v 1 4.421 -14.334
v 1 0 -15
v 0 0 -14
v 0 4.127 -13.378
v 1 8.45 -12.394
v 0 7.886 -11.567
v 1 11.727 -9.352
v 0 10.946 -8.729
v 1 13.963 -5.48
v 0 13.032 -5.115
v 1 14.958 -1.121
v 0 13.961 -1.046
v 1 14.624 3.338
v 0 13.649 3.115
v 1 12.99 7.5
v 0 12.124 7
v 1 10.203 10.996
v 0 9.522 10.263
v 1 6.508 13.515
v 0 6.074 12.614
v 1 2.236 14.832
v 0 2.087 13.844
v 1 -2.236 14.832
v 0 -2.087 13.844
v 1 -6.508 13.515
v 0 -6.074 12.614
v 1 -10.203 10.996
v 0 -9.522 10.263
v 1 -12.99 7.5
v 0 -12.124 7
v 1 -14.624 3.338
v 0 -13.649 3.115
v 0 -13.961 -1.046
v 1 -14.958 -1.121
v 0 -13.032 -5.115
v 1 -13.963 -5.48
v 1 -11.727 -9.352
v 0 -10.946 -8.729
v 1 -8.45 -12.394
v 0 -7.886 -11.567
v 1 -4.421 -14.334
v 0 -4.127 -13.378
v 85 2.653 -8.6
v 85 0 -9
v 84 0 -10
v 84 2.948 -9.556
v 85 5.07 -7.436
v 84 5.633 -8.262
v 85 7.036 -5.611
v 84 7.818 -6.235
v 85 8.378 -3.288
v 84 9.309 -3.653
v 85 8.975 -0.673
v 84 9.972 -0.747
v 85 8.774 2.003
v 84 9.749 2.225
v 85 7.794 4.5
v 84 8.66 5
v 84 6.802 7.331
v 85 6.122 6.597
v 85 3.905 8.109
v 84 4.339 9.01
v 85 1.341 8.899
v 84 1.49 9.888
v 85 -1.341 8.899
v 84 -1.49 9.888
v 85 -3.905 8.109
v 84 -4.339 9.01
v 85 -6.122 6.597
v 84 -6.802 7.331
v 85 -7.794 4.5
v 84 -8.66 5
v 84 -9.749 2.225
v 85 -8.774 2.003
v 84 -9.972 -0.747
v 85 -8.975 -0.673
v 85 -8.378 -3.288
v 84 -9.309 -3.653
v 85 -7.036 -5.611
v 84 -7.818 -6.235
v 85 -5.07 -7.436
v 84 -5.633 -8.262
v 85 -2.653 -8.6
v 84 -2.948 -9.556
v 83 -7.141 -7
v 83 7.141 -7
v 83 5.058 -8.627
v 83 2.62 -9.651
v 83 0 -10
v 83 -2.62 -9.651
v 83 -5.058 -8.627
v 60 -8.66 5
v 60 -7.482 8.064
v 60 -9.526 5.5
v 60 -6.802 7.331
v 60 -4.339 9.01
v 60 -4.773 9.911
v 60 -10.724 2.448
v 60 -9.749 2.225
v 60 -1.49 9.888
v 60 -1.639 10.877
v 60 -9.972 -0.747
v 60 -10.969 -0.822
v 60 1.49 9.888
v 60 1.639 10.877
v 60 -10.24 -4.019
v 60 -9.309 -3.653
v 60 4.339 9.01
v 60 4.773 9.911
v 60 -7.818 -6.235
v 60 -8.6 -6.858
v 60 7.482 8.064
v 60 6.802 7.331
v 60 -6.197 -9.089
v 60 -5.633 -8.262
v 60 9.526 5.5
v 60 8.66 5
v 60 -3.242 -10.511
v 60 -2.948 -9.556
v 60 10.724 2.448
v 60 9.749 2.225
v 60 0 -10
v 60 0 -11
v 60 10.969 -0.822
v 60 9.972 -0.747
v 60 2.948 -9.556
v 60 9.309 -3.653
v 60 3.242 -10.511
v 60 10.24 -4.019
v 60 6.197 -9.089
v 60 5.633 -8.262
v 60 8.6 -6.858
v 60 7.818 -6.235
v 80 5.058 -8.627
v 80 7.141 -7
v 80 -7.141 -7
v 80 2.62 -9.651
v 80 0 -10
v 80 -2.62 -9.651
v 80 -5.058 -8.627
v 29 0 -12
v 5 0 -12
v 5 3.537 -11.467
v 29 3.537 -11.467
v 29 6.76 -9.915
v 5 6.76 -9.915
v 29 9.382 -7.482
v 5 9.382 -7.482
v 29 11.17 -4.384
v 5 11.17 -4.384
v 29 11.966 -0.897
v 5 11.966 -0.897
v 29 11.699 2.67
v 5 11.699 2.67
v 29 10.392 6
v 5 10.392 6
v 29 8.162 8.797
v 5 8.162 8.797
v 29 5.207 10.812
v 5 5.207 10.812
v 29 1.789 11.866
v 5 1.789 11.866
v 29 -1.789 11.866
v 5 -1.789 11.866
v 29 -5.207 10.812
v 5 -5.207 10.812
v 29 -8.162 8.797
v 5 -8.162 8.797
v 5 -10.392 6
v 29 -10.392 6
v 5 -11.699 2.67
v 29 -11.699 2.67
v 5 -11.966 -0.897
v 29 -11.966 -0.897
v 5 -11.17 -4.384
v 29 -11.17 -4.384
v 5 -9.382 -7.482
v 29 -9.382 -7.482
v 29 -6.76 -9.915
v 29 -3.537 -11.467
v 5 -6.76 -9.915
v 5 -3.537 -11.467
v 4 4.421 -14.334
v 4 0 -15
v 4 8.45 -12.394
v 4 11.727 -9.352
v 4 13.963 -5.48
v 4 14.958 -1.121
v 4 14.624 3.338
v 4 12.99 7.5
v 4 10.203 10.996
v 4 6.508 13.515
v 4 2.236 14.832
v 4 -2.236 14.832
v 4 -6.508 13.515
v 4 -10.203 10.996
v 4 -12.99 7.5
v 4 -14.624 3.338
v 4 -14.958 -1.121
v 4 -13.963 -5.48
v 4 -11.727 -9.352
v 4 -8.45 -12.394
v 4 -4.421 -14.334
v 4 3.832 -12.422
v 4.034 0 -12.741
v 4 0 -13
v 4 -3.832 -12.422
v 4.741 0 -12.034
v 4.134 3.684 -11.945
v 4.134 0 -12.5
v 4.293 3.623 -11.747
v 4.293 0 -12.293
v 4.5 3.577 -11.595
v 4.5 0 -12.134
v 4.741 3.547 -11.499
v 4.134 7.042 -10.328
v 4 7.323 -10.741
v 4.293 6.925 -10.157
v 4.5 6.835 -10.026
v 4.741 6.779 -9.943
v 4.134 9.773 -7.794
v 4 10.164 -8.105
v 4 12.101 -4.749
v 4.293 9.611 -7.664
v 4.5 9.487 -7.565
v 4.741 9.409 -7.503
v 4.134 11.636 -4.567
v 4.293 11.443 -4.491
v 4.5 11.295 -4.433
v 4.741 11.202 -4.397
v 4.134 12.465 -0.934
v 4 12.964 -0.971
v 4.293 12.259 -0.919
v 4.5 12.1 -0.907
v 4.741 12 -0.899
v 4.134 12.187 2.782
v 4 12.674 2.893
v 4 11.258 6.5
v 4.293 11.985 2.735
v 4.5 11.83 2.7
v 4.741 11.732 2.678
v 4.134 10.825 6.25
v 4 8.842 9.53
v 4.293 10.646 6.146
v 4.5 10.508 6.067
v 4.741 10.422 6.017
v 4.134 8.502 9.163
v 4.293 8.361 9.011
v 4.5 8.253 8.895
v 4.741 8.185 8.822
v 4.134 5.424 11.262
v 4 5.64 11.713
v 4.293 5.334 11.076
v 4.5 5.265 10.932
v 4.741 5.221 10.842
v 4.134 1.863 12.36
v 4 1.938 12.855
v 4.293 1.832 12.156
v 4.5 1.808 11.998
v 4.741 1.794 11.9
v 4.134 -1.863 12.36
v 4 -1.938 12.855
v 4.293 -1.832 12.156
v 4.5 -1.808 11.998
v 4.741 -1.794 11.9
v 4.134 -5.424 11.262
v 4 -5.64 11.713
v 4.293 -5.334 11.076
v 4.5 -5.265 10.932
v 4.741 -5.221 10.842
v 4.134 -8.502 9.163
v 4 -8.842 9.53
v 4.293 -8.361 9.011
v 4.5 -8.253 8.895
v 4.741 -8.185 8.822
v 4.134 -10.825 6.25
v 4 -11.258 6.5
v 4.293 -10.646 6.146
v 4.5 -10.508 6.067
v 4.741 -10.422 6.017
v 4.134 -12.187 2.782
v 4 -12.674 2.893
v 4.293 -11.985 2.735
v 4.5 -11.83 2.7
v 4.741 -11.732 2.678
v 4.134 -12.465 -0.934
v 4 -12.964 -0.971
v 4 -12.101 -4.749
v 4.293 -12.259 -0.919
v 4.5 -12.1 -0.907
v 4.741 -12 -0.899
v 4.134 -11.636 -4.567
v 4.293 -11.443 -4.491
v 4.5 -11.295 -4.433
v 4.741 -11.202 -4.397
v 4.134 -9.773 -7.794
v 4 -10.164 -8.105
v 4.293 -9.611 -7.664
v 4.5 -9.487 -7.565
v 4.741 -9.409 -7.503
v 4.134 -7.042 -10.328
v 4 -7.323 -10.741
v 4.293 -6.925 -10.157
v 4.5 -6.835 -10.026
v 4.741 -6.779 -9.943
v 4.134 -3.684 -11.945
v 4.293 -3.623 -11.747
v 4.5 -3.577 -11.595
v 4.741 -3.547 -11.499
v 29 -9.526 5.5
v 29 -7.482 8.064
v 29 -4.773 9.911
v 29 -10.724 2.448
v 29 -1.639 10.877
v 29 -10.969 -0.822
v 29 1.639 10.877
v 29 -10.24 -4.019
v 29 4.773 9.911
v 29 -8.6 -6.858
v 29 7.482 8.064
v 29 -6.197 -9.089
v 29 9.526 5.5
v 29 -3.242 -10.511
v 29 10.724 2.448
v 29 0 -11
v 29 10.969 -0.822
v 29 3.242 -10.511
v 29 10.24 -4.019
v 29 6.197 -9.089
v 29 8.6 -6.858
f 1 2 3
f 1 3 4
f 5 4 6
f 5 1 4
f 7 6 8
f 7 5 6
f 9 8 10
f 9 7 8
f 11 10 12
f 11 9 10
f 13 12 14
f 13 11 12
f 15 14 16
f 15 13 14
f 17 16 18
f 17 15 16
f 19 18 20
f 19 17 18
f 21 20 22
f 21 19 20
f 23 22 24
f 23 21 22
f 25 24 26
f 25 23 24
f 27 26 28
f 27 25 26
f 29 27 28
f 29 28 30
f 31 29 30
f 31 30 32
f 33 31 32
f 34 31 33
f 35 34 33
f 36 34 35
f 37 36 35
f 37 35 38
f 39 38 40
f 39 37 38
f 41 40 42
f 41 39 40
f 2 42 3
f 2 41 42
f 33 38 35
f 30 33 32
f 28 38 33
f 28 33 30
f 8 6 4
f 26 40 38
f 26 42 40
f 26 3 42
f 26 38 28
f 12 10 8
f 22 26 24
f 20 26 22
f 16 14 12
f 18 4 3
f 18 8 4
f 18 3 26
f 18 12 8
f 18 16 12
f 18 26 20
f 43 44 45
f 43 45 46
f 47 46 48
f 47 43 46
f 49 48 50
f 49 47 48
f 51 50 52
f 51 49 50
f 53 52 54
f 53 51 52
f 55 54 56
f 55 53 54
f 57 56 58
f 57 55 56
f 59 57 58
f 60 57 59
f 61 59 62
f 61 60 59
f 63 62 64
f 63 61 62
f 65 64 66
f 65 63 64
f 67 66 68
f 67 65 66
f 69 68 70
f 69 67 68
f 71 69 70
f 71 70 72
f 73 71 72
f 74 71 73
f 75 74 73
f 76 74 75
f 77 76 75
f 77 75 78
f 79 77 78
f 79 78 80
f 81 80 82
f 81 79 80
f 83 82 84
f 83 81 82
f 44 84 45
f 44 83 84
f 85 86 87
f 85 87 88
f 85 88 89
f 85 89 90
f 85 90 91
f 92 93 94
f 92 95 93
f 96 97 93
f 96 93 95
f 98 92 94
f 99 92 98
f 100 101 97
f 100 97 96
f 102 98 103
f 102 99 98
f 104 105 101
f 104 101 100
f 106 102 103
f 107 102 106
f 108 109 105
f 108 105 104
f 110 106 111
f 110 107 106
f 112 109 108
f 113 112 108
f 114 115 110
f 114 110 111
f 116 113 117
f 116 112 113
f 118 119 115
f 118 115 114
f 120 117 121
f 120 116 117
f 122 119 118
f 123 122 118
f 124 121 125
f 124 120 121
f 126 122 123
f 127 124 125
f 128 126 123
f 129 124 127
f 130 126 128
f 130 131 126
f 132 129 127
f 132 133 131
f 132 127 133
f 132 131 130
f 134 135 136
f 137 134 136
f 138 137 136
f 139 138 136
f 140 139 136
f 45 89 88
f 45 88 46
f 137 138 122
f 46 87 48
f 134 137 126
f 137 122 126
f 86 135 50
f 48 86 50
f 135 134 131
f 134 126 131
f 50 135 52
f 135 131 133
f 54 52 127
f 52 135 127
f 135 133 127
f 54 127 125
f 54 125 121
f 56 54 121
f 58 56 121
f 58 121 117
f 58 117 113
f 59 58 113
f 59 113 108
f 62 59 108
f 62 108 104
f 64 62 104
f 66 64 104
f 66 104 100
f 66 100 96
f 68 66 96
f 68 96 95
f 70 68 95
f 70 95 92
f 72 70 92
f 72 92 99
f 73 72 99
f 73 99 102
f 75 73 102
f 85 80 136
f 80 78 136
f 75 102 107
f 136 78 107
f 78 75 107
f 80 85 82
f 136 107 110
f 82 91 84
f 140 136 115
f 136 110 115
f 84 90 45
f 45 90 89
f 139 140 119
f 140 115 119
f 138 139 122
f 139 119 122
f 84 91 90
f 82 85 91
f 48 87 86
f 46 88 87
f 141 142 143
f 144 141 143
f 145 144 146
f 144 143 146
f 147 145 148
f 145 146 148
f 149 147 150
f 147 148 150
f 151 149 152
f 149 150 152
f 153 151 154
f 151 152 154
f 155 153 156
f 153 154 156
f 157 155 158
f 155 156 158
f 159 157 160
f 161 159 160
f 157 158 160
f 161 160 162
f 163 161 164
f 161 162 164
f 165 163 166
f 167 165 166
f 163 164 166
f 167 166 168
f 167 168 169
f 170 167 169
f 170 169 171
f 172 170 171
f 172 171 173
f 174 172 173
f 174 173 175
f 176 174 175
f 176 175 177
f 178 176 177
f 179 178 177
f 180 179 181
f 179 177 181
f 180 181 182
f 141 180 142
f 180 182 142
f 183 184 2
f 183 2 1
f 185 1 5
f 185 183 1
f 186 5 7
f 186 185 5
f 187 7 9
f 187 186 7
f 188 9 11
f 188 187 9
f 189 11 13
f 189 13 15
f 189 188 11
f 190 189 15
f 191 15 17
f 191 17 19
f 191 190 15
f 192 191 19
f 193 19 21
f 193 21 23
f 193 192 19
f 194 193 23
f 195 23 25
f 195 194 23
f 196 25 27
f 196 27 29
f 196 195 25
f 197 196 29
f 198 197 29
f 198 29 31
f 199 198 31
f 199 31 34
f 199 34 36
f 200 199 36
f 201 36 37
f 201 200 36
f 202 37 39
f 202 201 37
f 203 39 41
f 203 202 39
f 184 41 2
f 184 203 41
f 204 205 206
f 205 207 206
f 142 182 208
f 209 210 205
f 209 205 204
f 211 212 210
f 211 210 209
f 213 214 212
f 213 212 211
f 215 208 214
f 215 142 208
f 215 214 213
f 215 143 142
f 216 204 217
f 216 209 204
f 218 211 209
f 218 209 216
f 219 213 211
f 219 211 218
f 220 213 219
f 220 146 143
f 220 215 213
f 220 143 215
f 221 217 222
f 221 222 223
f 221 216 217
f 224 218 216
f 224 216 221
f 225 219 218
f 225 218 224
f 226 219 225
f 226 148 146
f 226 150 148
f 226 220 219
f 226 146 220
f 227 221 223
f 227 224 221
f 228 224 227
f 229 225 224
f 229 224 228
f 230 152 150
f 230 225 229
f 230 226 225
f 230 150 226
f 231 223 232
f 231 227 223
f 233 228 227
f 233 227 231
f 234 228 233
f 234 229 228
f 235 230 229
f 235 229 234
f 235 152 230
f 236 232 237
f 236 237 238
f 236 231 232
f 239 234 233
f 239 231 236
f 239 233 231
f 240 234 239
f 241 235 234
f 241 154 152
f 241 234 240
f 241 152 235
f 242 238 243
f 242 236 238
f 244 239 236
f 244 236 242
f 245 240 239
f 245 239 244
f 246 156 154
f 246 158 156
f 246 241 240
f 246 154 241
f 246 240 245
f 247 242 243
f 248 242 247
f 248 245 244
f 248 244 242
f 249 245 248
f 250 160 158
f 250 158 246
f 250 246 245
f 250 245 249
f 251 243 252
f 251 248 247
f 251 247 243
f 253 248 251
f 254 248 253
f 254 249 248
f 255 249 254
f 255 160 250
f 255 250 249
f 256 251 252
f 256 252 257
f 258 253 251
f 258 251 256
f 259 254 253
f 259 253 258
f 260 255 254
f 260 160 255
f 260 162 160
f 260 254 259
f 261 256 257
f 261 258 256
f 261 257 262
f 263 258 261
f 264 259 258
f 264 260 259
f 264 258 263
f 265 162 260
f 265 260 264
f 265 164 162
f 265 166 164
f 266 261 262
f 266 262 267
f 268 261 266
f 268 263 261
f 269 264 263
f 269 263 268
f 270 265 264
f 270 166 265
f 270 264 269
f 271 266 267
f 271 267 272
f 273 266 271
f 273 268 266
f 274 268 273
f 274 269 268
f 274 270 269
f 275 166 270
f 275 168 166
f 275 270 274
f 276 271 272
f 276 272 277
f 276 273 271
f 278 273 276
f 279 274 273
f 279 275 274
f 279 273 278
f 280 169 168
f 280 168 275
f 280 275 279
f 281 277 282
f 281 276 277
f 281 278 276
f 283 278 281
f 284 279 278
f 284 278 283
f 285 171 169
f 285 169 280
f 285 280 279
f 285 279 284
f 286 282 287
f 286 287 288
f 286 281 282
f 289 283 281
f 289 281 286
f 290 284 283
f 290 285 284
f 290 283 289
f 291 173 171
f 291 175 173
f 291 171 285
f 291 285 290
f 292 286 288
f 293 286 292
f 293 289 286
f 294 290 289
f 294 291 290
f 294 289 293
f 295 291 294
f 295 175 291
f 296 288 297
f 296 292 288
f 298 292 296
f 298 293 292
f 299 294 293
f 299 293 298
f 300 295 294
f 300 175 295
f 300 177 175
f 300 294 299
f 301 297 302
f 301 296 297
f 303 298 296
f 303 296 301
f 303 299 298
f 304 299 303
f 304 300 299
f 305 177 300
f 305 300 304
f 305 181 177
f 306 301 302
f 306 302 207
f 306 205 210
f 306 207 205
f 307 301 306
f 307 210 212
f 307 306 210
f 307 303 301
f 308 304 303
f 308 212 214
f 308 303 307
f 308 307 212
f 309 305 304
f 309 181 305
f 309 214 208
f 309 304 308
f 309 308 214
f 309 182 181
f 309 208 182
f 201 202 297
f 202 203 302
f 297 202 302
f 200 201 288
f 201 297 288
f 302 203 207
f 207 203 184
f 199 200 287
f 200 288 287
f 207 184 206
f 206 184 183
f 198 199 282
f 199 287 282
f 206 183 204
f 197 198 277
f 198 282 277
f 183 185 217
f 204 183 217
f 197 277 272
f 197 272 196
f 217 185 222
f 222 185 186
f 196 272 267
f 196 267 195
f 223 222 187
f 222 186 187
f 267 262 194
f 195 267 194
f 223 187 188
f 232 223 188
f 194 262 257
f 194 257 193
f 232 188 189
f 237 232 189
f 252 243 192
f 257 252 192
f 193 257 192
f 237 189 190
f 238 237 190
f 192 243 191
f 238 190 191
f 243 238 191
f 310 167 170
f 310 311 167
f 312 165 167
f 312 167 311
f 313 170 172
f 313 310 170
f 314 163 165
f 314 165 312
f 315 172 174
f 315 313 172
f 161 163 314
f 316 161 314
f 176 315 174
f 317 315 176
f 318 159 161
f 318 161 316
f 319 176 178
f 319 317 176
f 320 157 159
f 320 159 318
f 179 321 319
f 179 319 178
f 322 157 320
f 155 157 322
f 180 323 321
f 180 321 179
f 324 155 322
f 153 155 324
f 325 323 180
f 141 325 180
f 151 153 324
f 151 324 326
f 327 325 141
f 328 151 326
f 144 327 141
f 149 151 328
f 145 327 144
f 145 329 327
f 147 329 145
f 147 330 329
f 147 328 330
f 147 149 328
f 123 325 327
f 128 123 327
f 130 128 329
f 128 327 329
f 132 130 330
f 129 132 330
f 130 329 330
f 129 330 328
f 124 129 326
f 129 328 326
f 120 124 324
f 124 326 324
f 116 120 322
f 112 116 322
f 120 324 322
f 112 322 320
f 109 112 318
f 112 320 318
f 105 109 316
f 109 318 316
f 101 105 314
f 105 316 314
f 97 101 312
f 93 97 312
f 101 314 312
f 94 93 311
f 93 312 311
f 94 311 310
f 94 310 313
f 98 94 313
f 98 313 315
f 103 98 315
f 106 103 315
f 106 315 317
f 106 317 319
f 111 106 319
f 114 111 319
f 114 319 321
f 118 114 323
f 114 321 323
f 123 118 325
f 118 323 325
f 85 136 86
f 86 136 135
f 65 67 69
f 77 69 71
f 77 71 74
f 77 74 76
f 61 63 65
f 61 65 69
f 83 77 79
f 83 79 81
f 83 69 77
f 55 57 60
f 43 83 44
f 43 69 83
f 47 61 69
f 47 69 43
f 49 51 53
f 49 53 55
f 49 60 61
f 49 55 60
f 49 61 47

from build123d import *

# Parameters (mm, degrees)
SKETCH_1_W          = 4
SKETCH_1_H          = 15
SKETCH_2_R          = 12
EXTRUDE_1_DEPTH     = 25
SKETCH_3_R          = 11
EXTRUDE_2_DEPTH     = 31
SKETCH_4_R          = 10
EXTRUDE_3_DEPTH     = 25
CUT_EXTRUDE_1_DEPTH = 3
CHAMFER_1_SIZE      = 1
FILLET_1_R          = 1


with BuildPart() as part:
    # Эскиз1 → Повернуть1 (revolve)
    with BuildSketch(Plane.XY, mode=Mode.PRIVATE) as revolve_1_sk:
        with Locations((2, 7.5)):
            Rectangle(SKETCH_1_W, SKETCH_1_H)
    revolve(revolve_1_sk.sketch.rotate(Axis((0, 0, 0), (1, 0, 0)), 270), axis=Axis((0, 0, 0), (1, 0, 0)))

    # Эскиз2 → Бобышка-Вытянуть1 (add)
    with BuildSketch(Plane(origin=(4, 0, 0), x_dir=(0, 0, -1), z_dir=(1, 0, 0))):
        Circle(SKETCH_2_R)
    extrude(amount=EXTRUDE_1_DEPTH)

    # Эскиз3 → Бобышка-Вытянуть2 (add)
    with BuildSketch(Plane(origin=(29, 0, 0), x_dir=(0, 0, -1), z_dir=(1, 0, 0))):
        Circle(SKETCH_3_R)
    extrude(amount=EXTRUDE_2_DEPTH)

    # Эскиз4 → Бобышка-Вытянуть3 (add)
    with BuildSketch(Plane(origin=(60, 0, 0), x_dir=(0, 0, -1), z_dir=(1, 0, 0))):
        Circle(SKETCH_4_R)
    extrude(amount=EXTRUDE_3_DEPTH)

    # Эскиз5 → Вырез-Вытянуть1 (cut)
    with BuildSketch(Plane(origin=(80, 0, 0), x_dir=(0, -1, 0), z_dir=(-1, 0, 0))):
        with BuildLine():
            Line((7.141428429, -7), (-7.141428429, -7))
            ThreePointArc((-7.141428429, -7), (0, -10), (7.141428429, -7))
        make_face()
    extrude(amount=-CUT_EXTRUDE_1_DEPTH, mode=Mode.SUBTRACT)

    # Фаска1
    chamfer_1_edges = [part.edges().sort_by_distance(p)[0] for p in [
        (85, 0, 10),
        (0, 0, 15),
    ]]
    chamfer(chamfer_1_edges, length=CHAMFER_1_SIZE)

    # Скругление1
    fillet_1_edges = [part.edges().sort_by_distance(p)[0] for p in [
        (4, 0, 12),
    ]]
    fillet(fillet_1_edges, radius=FILLET_1_R)


solid = part.part
